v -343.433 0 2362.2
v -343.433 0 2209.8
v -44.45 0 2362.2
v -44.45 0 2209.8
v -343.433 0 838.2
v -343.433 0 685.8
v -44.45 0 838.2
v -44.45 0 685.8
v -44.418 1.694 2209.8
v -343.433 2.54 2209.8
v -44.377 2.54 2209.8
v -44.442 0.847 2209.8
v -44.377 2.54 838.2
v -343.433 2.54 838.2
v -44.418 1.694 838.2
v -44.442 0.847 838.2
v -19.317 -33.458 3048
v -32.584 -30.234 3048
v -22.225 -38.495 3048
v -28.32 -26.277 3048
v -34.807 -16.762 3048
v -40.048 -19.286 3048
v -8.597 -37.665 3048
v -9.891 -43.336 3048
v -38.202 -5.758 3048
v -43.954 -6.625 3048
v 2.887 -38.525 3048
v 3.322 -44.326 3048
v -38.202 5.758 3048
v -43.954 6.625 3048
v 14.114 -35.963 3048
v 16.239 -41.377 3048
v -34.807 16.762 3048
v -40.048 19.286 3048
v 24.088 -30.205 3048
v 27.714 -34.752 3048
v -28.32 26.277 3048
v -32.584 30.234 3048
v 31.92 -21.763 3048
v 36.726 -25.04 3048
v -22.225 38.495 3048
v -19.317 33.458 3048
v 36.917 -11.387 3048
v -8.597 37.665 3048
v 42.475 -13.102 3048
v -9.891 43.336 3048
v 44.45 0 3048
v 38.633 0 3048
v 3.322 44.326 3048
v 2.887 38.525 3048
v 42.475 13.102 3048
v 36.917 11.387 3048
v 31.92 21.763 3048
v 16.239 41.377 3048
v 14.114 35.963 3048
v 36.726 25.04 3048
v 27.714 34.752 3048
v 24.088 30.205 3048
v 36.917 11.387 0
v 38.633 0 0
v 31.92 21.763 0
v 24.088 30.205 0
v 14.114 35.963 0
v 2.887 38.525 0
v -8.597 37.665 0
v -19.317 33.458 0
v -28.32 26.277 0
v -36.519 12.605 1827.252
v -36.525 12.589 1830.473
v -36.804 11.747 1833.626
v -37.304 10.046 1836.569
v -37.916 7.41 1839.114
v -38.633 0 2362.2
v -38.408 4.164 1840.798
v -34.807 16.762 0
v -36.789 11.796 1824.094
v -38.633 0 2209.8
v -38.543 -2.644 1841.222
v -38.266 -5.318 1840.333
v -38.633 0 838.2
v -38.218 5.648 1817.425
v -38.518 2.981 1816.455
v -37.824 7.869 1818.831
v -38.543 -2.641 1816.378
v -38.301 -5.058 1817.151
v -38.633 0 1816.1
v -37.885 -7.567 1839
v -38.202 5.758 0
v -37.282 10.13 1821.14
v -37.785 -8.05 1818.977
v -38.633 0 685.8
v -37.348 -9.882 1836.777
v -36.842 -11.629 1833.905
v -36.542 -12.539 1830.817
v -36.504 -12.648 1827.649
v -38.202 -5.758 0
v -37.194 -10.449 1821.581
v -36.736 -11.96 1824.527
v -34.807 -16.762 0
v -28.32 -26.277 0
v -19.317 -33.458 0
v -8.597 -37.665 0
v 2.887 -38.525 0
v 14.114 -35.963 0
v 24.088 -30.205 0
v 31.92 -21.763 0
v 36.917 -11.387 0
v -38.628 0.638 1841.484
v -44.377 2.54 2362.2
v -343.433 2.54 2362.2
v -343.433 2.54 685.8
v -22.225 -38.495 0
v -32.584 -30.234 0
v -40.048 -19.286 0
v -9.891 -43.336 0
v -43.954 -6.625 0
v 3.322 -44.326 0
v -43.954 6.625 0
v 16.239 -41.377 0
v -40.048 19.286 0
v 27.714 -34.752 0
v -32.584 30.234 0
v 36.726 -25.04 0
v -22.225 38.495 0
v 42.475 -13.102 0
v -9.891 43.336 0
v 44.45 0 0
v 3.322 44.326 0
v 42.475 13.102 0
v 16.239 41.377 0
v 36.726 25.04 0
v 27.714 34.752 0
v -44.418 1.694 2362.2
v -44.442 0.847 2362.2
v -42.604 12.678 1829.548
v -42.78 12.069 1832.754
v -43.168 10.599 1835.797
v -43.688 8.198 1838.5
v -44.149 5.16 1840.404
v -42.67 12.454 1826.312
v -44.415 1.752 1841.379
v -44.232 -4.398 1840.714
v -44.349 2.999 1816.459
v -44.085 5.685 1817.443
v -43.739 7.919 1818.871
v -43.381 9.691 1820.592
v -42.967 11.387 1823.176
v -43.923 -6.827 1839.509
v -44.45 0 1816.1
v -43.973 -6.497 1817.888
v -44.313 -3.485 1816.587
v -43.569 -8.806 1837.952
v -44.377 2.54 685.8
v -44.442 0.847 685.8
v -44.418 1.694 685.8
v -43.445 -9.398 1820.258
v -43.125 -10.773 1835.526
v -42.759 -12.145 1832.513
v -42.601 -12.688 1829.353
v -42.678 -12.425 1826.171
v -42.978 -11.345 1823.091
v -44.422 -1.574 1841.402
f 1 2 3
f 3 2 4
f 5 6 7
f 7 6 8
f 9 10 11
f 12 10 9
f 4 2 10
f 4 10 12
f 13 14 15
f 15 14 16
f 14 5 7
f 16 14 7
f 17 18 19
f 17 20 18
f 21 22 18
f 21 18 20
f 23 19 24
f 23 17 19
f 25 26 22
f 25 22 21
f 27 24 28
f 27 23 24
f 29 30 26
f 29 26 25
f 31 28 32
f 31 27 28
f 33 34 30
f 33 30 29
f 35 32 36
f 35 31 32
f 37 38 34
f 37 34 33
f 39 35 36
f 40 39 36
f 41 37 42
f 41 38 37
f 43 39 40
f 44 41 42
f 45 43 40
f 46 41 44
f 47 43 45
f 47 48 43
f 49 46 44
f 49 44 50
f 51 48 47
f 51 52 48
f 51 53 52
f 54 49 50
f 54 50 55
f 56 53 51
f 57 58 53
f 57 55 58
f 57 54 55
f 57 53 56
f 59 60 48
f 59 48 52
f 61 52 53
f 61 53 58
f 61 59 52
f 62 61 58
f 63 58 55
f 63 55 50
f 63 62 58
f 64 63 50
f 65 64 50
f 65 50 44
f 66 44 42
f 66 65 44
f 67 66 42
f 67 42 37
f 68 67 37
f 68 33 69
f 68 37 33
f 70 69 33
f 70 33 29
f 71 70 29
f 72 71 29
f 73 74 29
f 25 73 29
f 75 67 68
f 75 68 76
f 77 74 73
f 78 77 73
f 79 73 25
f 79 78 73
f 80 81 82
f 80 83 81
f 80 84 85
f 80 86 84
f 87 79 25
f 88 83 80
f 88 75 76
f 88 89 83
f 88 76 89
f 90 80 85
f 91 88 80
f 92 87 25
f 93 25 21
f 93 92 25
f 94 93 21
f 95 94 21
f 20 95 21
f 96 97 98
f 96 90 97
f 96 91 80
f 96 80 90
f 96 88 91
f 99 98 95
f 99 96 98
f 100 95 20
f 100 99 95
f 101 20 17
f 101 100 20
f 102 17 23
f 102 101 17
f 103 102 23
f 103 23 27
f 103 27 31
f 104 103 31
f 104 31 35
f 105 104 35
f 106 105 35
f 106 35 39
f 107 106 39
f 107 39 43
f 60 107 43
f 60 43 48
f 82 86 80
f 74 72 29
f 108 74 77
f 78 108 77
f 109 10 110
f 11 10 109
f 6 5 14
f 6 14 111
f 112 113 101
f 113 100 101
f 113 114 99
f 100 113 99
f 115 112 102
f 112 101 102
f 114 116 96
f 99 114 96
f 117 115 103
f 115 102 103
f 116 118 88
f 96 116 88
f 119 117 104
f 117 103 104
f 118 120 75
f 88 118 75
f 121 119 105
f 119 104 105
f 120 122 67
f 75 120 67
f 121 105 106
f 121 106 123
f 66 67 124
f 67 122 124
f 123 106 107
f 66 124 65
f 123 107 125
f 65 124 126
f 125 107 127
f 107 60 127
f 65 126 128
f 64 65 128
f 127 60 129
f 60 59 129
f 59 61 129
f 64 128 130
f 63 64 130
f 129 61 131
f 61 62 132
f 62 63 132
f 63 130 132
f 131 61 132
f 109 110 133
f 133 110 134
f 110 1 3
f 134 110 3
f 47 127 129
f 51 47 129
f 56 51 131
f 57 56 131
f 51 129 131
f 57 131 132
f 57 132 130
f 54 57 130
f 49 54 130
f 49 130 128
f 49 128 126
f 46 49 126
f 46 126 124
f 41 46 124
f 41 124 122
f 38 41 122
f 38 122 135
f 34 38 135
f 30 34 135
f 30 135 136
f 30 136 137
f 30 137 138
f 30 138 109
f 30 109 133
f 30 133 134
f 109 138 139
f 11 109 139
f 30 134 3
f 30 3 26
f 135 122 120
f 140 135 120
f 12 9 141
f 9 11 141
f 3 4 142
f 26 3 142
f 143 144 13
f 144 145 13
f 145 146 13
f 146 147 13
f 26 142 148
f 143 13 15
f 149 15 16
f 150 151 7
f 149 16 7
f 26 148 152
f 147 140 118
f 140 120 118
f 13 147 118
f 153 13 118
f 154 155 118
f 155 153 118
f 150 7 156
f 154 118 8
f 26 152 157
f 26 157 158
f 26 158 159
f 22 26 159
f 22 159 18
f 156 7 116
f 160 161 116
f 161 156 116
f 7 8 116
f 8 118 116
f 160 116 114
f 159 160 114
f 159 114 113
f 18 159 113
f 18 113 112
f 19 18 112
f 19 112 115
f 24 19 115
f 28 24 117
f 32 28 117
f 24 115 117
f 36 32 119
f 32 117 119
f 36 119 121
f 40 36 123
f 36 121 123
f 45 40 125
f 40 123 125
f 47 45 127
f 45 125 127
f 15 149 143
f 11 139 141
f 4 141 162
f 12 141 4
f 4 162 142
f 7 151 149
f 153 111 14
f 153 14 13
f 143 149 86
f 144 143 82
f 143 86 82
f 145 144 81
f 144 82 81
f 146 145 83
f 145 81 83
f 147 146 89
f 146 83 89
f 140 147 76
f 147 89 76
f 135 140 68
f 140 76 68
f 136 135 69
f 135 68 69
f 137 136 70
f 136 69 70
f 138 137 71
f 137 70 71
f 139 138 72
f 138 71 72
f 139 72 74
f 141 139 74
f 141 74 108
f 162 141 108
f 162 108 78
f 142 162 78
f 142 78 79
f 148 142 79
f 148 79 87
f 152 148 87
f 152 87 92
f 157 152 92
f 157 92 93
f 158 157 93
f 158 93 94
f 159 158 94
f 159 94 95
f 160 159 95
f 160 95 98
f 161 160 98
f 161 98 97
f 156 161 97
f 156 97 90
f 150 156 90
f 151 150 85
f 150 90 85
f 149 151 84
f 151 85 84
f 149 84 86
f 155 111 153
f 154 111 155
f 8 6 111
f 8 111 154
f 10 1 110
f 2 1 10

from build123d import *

# Parameters (mm, degrees)
SKETCH1_R           = 44.45
SKETCH1_R_2         = 38.6334
BOSS_EXTRUDE1_DEPTH = 3048
SKETCH2_R           = 12.7
CUT_EXTRUDE1_DEPTH  = 45.45
SKETCH3_W           = 304.8
SKETCH3_H           = 152.4
BOSS_EXTRUDE2_DEPTH = 2.54


with BuildPart() as part:
    # Sketch1 → Boss-Extrude1 (new body)
    with BuildSketch(Plane.XY):
        Circle(SKETCH1_R)
        Circle(SKETCH1_R_2, mode=Mode.SUBTRACT)
    extrude(amount=BOSS_EXTRUDE1_DEPTH)

    # Sketch2 → Cut-Extrude1 (cut, through all)
    with BuildSketch(Plane(origin=(0, 0, 0), x_dir=(0, 0, -1), z_dir=(1, 0, 0))):
        with Locations((-1828.8, 0)):
            Circle(SKETCH2_R)
    extrude(amount=-CUT_EXTRUDE1_DEPTH, mode=Mode.SUBTRACT)

    # Sketch3 → Boss-Extrude2 (add)
    with BuildSketch(Plane(origin=(0, 0, 0), x_dir=(1, 0, 0), z_dir=(0, 1, 0))):
        with Locations((-191.0334, -762)):
            Rectangle(SKETCH3_W, SKETCH3_H)
        with Locations((-191.0334, -2286)):
            Rectangle(SKETCH3_W, SKETCH3_H)
    extrude(amount=BOSS_EXTRUDE2_DEPTH)


solid = part.part
